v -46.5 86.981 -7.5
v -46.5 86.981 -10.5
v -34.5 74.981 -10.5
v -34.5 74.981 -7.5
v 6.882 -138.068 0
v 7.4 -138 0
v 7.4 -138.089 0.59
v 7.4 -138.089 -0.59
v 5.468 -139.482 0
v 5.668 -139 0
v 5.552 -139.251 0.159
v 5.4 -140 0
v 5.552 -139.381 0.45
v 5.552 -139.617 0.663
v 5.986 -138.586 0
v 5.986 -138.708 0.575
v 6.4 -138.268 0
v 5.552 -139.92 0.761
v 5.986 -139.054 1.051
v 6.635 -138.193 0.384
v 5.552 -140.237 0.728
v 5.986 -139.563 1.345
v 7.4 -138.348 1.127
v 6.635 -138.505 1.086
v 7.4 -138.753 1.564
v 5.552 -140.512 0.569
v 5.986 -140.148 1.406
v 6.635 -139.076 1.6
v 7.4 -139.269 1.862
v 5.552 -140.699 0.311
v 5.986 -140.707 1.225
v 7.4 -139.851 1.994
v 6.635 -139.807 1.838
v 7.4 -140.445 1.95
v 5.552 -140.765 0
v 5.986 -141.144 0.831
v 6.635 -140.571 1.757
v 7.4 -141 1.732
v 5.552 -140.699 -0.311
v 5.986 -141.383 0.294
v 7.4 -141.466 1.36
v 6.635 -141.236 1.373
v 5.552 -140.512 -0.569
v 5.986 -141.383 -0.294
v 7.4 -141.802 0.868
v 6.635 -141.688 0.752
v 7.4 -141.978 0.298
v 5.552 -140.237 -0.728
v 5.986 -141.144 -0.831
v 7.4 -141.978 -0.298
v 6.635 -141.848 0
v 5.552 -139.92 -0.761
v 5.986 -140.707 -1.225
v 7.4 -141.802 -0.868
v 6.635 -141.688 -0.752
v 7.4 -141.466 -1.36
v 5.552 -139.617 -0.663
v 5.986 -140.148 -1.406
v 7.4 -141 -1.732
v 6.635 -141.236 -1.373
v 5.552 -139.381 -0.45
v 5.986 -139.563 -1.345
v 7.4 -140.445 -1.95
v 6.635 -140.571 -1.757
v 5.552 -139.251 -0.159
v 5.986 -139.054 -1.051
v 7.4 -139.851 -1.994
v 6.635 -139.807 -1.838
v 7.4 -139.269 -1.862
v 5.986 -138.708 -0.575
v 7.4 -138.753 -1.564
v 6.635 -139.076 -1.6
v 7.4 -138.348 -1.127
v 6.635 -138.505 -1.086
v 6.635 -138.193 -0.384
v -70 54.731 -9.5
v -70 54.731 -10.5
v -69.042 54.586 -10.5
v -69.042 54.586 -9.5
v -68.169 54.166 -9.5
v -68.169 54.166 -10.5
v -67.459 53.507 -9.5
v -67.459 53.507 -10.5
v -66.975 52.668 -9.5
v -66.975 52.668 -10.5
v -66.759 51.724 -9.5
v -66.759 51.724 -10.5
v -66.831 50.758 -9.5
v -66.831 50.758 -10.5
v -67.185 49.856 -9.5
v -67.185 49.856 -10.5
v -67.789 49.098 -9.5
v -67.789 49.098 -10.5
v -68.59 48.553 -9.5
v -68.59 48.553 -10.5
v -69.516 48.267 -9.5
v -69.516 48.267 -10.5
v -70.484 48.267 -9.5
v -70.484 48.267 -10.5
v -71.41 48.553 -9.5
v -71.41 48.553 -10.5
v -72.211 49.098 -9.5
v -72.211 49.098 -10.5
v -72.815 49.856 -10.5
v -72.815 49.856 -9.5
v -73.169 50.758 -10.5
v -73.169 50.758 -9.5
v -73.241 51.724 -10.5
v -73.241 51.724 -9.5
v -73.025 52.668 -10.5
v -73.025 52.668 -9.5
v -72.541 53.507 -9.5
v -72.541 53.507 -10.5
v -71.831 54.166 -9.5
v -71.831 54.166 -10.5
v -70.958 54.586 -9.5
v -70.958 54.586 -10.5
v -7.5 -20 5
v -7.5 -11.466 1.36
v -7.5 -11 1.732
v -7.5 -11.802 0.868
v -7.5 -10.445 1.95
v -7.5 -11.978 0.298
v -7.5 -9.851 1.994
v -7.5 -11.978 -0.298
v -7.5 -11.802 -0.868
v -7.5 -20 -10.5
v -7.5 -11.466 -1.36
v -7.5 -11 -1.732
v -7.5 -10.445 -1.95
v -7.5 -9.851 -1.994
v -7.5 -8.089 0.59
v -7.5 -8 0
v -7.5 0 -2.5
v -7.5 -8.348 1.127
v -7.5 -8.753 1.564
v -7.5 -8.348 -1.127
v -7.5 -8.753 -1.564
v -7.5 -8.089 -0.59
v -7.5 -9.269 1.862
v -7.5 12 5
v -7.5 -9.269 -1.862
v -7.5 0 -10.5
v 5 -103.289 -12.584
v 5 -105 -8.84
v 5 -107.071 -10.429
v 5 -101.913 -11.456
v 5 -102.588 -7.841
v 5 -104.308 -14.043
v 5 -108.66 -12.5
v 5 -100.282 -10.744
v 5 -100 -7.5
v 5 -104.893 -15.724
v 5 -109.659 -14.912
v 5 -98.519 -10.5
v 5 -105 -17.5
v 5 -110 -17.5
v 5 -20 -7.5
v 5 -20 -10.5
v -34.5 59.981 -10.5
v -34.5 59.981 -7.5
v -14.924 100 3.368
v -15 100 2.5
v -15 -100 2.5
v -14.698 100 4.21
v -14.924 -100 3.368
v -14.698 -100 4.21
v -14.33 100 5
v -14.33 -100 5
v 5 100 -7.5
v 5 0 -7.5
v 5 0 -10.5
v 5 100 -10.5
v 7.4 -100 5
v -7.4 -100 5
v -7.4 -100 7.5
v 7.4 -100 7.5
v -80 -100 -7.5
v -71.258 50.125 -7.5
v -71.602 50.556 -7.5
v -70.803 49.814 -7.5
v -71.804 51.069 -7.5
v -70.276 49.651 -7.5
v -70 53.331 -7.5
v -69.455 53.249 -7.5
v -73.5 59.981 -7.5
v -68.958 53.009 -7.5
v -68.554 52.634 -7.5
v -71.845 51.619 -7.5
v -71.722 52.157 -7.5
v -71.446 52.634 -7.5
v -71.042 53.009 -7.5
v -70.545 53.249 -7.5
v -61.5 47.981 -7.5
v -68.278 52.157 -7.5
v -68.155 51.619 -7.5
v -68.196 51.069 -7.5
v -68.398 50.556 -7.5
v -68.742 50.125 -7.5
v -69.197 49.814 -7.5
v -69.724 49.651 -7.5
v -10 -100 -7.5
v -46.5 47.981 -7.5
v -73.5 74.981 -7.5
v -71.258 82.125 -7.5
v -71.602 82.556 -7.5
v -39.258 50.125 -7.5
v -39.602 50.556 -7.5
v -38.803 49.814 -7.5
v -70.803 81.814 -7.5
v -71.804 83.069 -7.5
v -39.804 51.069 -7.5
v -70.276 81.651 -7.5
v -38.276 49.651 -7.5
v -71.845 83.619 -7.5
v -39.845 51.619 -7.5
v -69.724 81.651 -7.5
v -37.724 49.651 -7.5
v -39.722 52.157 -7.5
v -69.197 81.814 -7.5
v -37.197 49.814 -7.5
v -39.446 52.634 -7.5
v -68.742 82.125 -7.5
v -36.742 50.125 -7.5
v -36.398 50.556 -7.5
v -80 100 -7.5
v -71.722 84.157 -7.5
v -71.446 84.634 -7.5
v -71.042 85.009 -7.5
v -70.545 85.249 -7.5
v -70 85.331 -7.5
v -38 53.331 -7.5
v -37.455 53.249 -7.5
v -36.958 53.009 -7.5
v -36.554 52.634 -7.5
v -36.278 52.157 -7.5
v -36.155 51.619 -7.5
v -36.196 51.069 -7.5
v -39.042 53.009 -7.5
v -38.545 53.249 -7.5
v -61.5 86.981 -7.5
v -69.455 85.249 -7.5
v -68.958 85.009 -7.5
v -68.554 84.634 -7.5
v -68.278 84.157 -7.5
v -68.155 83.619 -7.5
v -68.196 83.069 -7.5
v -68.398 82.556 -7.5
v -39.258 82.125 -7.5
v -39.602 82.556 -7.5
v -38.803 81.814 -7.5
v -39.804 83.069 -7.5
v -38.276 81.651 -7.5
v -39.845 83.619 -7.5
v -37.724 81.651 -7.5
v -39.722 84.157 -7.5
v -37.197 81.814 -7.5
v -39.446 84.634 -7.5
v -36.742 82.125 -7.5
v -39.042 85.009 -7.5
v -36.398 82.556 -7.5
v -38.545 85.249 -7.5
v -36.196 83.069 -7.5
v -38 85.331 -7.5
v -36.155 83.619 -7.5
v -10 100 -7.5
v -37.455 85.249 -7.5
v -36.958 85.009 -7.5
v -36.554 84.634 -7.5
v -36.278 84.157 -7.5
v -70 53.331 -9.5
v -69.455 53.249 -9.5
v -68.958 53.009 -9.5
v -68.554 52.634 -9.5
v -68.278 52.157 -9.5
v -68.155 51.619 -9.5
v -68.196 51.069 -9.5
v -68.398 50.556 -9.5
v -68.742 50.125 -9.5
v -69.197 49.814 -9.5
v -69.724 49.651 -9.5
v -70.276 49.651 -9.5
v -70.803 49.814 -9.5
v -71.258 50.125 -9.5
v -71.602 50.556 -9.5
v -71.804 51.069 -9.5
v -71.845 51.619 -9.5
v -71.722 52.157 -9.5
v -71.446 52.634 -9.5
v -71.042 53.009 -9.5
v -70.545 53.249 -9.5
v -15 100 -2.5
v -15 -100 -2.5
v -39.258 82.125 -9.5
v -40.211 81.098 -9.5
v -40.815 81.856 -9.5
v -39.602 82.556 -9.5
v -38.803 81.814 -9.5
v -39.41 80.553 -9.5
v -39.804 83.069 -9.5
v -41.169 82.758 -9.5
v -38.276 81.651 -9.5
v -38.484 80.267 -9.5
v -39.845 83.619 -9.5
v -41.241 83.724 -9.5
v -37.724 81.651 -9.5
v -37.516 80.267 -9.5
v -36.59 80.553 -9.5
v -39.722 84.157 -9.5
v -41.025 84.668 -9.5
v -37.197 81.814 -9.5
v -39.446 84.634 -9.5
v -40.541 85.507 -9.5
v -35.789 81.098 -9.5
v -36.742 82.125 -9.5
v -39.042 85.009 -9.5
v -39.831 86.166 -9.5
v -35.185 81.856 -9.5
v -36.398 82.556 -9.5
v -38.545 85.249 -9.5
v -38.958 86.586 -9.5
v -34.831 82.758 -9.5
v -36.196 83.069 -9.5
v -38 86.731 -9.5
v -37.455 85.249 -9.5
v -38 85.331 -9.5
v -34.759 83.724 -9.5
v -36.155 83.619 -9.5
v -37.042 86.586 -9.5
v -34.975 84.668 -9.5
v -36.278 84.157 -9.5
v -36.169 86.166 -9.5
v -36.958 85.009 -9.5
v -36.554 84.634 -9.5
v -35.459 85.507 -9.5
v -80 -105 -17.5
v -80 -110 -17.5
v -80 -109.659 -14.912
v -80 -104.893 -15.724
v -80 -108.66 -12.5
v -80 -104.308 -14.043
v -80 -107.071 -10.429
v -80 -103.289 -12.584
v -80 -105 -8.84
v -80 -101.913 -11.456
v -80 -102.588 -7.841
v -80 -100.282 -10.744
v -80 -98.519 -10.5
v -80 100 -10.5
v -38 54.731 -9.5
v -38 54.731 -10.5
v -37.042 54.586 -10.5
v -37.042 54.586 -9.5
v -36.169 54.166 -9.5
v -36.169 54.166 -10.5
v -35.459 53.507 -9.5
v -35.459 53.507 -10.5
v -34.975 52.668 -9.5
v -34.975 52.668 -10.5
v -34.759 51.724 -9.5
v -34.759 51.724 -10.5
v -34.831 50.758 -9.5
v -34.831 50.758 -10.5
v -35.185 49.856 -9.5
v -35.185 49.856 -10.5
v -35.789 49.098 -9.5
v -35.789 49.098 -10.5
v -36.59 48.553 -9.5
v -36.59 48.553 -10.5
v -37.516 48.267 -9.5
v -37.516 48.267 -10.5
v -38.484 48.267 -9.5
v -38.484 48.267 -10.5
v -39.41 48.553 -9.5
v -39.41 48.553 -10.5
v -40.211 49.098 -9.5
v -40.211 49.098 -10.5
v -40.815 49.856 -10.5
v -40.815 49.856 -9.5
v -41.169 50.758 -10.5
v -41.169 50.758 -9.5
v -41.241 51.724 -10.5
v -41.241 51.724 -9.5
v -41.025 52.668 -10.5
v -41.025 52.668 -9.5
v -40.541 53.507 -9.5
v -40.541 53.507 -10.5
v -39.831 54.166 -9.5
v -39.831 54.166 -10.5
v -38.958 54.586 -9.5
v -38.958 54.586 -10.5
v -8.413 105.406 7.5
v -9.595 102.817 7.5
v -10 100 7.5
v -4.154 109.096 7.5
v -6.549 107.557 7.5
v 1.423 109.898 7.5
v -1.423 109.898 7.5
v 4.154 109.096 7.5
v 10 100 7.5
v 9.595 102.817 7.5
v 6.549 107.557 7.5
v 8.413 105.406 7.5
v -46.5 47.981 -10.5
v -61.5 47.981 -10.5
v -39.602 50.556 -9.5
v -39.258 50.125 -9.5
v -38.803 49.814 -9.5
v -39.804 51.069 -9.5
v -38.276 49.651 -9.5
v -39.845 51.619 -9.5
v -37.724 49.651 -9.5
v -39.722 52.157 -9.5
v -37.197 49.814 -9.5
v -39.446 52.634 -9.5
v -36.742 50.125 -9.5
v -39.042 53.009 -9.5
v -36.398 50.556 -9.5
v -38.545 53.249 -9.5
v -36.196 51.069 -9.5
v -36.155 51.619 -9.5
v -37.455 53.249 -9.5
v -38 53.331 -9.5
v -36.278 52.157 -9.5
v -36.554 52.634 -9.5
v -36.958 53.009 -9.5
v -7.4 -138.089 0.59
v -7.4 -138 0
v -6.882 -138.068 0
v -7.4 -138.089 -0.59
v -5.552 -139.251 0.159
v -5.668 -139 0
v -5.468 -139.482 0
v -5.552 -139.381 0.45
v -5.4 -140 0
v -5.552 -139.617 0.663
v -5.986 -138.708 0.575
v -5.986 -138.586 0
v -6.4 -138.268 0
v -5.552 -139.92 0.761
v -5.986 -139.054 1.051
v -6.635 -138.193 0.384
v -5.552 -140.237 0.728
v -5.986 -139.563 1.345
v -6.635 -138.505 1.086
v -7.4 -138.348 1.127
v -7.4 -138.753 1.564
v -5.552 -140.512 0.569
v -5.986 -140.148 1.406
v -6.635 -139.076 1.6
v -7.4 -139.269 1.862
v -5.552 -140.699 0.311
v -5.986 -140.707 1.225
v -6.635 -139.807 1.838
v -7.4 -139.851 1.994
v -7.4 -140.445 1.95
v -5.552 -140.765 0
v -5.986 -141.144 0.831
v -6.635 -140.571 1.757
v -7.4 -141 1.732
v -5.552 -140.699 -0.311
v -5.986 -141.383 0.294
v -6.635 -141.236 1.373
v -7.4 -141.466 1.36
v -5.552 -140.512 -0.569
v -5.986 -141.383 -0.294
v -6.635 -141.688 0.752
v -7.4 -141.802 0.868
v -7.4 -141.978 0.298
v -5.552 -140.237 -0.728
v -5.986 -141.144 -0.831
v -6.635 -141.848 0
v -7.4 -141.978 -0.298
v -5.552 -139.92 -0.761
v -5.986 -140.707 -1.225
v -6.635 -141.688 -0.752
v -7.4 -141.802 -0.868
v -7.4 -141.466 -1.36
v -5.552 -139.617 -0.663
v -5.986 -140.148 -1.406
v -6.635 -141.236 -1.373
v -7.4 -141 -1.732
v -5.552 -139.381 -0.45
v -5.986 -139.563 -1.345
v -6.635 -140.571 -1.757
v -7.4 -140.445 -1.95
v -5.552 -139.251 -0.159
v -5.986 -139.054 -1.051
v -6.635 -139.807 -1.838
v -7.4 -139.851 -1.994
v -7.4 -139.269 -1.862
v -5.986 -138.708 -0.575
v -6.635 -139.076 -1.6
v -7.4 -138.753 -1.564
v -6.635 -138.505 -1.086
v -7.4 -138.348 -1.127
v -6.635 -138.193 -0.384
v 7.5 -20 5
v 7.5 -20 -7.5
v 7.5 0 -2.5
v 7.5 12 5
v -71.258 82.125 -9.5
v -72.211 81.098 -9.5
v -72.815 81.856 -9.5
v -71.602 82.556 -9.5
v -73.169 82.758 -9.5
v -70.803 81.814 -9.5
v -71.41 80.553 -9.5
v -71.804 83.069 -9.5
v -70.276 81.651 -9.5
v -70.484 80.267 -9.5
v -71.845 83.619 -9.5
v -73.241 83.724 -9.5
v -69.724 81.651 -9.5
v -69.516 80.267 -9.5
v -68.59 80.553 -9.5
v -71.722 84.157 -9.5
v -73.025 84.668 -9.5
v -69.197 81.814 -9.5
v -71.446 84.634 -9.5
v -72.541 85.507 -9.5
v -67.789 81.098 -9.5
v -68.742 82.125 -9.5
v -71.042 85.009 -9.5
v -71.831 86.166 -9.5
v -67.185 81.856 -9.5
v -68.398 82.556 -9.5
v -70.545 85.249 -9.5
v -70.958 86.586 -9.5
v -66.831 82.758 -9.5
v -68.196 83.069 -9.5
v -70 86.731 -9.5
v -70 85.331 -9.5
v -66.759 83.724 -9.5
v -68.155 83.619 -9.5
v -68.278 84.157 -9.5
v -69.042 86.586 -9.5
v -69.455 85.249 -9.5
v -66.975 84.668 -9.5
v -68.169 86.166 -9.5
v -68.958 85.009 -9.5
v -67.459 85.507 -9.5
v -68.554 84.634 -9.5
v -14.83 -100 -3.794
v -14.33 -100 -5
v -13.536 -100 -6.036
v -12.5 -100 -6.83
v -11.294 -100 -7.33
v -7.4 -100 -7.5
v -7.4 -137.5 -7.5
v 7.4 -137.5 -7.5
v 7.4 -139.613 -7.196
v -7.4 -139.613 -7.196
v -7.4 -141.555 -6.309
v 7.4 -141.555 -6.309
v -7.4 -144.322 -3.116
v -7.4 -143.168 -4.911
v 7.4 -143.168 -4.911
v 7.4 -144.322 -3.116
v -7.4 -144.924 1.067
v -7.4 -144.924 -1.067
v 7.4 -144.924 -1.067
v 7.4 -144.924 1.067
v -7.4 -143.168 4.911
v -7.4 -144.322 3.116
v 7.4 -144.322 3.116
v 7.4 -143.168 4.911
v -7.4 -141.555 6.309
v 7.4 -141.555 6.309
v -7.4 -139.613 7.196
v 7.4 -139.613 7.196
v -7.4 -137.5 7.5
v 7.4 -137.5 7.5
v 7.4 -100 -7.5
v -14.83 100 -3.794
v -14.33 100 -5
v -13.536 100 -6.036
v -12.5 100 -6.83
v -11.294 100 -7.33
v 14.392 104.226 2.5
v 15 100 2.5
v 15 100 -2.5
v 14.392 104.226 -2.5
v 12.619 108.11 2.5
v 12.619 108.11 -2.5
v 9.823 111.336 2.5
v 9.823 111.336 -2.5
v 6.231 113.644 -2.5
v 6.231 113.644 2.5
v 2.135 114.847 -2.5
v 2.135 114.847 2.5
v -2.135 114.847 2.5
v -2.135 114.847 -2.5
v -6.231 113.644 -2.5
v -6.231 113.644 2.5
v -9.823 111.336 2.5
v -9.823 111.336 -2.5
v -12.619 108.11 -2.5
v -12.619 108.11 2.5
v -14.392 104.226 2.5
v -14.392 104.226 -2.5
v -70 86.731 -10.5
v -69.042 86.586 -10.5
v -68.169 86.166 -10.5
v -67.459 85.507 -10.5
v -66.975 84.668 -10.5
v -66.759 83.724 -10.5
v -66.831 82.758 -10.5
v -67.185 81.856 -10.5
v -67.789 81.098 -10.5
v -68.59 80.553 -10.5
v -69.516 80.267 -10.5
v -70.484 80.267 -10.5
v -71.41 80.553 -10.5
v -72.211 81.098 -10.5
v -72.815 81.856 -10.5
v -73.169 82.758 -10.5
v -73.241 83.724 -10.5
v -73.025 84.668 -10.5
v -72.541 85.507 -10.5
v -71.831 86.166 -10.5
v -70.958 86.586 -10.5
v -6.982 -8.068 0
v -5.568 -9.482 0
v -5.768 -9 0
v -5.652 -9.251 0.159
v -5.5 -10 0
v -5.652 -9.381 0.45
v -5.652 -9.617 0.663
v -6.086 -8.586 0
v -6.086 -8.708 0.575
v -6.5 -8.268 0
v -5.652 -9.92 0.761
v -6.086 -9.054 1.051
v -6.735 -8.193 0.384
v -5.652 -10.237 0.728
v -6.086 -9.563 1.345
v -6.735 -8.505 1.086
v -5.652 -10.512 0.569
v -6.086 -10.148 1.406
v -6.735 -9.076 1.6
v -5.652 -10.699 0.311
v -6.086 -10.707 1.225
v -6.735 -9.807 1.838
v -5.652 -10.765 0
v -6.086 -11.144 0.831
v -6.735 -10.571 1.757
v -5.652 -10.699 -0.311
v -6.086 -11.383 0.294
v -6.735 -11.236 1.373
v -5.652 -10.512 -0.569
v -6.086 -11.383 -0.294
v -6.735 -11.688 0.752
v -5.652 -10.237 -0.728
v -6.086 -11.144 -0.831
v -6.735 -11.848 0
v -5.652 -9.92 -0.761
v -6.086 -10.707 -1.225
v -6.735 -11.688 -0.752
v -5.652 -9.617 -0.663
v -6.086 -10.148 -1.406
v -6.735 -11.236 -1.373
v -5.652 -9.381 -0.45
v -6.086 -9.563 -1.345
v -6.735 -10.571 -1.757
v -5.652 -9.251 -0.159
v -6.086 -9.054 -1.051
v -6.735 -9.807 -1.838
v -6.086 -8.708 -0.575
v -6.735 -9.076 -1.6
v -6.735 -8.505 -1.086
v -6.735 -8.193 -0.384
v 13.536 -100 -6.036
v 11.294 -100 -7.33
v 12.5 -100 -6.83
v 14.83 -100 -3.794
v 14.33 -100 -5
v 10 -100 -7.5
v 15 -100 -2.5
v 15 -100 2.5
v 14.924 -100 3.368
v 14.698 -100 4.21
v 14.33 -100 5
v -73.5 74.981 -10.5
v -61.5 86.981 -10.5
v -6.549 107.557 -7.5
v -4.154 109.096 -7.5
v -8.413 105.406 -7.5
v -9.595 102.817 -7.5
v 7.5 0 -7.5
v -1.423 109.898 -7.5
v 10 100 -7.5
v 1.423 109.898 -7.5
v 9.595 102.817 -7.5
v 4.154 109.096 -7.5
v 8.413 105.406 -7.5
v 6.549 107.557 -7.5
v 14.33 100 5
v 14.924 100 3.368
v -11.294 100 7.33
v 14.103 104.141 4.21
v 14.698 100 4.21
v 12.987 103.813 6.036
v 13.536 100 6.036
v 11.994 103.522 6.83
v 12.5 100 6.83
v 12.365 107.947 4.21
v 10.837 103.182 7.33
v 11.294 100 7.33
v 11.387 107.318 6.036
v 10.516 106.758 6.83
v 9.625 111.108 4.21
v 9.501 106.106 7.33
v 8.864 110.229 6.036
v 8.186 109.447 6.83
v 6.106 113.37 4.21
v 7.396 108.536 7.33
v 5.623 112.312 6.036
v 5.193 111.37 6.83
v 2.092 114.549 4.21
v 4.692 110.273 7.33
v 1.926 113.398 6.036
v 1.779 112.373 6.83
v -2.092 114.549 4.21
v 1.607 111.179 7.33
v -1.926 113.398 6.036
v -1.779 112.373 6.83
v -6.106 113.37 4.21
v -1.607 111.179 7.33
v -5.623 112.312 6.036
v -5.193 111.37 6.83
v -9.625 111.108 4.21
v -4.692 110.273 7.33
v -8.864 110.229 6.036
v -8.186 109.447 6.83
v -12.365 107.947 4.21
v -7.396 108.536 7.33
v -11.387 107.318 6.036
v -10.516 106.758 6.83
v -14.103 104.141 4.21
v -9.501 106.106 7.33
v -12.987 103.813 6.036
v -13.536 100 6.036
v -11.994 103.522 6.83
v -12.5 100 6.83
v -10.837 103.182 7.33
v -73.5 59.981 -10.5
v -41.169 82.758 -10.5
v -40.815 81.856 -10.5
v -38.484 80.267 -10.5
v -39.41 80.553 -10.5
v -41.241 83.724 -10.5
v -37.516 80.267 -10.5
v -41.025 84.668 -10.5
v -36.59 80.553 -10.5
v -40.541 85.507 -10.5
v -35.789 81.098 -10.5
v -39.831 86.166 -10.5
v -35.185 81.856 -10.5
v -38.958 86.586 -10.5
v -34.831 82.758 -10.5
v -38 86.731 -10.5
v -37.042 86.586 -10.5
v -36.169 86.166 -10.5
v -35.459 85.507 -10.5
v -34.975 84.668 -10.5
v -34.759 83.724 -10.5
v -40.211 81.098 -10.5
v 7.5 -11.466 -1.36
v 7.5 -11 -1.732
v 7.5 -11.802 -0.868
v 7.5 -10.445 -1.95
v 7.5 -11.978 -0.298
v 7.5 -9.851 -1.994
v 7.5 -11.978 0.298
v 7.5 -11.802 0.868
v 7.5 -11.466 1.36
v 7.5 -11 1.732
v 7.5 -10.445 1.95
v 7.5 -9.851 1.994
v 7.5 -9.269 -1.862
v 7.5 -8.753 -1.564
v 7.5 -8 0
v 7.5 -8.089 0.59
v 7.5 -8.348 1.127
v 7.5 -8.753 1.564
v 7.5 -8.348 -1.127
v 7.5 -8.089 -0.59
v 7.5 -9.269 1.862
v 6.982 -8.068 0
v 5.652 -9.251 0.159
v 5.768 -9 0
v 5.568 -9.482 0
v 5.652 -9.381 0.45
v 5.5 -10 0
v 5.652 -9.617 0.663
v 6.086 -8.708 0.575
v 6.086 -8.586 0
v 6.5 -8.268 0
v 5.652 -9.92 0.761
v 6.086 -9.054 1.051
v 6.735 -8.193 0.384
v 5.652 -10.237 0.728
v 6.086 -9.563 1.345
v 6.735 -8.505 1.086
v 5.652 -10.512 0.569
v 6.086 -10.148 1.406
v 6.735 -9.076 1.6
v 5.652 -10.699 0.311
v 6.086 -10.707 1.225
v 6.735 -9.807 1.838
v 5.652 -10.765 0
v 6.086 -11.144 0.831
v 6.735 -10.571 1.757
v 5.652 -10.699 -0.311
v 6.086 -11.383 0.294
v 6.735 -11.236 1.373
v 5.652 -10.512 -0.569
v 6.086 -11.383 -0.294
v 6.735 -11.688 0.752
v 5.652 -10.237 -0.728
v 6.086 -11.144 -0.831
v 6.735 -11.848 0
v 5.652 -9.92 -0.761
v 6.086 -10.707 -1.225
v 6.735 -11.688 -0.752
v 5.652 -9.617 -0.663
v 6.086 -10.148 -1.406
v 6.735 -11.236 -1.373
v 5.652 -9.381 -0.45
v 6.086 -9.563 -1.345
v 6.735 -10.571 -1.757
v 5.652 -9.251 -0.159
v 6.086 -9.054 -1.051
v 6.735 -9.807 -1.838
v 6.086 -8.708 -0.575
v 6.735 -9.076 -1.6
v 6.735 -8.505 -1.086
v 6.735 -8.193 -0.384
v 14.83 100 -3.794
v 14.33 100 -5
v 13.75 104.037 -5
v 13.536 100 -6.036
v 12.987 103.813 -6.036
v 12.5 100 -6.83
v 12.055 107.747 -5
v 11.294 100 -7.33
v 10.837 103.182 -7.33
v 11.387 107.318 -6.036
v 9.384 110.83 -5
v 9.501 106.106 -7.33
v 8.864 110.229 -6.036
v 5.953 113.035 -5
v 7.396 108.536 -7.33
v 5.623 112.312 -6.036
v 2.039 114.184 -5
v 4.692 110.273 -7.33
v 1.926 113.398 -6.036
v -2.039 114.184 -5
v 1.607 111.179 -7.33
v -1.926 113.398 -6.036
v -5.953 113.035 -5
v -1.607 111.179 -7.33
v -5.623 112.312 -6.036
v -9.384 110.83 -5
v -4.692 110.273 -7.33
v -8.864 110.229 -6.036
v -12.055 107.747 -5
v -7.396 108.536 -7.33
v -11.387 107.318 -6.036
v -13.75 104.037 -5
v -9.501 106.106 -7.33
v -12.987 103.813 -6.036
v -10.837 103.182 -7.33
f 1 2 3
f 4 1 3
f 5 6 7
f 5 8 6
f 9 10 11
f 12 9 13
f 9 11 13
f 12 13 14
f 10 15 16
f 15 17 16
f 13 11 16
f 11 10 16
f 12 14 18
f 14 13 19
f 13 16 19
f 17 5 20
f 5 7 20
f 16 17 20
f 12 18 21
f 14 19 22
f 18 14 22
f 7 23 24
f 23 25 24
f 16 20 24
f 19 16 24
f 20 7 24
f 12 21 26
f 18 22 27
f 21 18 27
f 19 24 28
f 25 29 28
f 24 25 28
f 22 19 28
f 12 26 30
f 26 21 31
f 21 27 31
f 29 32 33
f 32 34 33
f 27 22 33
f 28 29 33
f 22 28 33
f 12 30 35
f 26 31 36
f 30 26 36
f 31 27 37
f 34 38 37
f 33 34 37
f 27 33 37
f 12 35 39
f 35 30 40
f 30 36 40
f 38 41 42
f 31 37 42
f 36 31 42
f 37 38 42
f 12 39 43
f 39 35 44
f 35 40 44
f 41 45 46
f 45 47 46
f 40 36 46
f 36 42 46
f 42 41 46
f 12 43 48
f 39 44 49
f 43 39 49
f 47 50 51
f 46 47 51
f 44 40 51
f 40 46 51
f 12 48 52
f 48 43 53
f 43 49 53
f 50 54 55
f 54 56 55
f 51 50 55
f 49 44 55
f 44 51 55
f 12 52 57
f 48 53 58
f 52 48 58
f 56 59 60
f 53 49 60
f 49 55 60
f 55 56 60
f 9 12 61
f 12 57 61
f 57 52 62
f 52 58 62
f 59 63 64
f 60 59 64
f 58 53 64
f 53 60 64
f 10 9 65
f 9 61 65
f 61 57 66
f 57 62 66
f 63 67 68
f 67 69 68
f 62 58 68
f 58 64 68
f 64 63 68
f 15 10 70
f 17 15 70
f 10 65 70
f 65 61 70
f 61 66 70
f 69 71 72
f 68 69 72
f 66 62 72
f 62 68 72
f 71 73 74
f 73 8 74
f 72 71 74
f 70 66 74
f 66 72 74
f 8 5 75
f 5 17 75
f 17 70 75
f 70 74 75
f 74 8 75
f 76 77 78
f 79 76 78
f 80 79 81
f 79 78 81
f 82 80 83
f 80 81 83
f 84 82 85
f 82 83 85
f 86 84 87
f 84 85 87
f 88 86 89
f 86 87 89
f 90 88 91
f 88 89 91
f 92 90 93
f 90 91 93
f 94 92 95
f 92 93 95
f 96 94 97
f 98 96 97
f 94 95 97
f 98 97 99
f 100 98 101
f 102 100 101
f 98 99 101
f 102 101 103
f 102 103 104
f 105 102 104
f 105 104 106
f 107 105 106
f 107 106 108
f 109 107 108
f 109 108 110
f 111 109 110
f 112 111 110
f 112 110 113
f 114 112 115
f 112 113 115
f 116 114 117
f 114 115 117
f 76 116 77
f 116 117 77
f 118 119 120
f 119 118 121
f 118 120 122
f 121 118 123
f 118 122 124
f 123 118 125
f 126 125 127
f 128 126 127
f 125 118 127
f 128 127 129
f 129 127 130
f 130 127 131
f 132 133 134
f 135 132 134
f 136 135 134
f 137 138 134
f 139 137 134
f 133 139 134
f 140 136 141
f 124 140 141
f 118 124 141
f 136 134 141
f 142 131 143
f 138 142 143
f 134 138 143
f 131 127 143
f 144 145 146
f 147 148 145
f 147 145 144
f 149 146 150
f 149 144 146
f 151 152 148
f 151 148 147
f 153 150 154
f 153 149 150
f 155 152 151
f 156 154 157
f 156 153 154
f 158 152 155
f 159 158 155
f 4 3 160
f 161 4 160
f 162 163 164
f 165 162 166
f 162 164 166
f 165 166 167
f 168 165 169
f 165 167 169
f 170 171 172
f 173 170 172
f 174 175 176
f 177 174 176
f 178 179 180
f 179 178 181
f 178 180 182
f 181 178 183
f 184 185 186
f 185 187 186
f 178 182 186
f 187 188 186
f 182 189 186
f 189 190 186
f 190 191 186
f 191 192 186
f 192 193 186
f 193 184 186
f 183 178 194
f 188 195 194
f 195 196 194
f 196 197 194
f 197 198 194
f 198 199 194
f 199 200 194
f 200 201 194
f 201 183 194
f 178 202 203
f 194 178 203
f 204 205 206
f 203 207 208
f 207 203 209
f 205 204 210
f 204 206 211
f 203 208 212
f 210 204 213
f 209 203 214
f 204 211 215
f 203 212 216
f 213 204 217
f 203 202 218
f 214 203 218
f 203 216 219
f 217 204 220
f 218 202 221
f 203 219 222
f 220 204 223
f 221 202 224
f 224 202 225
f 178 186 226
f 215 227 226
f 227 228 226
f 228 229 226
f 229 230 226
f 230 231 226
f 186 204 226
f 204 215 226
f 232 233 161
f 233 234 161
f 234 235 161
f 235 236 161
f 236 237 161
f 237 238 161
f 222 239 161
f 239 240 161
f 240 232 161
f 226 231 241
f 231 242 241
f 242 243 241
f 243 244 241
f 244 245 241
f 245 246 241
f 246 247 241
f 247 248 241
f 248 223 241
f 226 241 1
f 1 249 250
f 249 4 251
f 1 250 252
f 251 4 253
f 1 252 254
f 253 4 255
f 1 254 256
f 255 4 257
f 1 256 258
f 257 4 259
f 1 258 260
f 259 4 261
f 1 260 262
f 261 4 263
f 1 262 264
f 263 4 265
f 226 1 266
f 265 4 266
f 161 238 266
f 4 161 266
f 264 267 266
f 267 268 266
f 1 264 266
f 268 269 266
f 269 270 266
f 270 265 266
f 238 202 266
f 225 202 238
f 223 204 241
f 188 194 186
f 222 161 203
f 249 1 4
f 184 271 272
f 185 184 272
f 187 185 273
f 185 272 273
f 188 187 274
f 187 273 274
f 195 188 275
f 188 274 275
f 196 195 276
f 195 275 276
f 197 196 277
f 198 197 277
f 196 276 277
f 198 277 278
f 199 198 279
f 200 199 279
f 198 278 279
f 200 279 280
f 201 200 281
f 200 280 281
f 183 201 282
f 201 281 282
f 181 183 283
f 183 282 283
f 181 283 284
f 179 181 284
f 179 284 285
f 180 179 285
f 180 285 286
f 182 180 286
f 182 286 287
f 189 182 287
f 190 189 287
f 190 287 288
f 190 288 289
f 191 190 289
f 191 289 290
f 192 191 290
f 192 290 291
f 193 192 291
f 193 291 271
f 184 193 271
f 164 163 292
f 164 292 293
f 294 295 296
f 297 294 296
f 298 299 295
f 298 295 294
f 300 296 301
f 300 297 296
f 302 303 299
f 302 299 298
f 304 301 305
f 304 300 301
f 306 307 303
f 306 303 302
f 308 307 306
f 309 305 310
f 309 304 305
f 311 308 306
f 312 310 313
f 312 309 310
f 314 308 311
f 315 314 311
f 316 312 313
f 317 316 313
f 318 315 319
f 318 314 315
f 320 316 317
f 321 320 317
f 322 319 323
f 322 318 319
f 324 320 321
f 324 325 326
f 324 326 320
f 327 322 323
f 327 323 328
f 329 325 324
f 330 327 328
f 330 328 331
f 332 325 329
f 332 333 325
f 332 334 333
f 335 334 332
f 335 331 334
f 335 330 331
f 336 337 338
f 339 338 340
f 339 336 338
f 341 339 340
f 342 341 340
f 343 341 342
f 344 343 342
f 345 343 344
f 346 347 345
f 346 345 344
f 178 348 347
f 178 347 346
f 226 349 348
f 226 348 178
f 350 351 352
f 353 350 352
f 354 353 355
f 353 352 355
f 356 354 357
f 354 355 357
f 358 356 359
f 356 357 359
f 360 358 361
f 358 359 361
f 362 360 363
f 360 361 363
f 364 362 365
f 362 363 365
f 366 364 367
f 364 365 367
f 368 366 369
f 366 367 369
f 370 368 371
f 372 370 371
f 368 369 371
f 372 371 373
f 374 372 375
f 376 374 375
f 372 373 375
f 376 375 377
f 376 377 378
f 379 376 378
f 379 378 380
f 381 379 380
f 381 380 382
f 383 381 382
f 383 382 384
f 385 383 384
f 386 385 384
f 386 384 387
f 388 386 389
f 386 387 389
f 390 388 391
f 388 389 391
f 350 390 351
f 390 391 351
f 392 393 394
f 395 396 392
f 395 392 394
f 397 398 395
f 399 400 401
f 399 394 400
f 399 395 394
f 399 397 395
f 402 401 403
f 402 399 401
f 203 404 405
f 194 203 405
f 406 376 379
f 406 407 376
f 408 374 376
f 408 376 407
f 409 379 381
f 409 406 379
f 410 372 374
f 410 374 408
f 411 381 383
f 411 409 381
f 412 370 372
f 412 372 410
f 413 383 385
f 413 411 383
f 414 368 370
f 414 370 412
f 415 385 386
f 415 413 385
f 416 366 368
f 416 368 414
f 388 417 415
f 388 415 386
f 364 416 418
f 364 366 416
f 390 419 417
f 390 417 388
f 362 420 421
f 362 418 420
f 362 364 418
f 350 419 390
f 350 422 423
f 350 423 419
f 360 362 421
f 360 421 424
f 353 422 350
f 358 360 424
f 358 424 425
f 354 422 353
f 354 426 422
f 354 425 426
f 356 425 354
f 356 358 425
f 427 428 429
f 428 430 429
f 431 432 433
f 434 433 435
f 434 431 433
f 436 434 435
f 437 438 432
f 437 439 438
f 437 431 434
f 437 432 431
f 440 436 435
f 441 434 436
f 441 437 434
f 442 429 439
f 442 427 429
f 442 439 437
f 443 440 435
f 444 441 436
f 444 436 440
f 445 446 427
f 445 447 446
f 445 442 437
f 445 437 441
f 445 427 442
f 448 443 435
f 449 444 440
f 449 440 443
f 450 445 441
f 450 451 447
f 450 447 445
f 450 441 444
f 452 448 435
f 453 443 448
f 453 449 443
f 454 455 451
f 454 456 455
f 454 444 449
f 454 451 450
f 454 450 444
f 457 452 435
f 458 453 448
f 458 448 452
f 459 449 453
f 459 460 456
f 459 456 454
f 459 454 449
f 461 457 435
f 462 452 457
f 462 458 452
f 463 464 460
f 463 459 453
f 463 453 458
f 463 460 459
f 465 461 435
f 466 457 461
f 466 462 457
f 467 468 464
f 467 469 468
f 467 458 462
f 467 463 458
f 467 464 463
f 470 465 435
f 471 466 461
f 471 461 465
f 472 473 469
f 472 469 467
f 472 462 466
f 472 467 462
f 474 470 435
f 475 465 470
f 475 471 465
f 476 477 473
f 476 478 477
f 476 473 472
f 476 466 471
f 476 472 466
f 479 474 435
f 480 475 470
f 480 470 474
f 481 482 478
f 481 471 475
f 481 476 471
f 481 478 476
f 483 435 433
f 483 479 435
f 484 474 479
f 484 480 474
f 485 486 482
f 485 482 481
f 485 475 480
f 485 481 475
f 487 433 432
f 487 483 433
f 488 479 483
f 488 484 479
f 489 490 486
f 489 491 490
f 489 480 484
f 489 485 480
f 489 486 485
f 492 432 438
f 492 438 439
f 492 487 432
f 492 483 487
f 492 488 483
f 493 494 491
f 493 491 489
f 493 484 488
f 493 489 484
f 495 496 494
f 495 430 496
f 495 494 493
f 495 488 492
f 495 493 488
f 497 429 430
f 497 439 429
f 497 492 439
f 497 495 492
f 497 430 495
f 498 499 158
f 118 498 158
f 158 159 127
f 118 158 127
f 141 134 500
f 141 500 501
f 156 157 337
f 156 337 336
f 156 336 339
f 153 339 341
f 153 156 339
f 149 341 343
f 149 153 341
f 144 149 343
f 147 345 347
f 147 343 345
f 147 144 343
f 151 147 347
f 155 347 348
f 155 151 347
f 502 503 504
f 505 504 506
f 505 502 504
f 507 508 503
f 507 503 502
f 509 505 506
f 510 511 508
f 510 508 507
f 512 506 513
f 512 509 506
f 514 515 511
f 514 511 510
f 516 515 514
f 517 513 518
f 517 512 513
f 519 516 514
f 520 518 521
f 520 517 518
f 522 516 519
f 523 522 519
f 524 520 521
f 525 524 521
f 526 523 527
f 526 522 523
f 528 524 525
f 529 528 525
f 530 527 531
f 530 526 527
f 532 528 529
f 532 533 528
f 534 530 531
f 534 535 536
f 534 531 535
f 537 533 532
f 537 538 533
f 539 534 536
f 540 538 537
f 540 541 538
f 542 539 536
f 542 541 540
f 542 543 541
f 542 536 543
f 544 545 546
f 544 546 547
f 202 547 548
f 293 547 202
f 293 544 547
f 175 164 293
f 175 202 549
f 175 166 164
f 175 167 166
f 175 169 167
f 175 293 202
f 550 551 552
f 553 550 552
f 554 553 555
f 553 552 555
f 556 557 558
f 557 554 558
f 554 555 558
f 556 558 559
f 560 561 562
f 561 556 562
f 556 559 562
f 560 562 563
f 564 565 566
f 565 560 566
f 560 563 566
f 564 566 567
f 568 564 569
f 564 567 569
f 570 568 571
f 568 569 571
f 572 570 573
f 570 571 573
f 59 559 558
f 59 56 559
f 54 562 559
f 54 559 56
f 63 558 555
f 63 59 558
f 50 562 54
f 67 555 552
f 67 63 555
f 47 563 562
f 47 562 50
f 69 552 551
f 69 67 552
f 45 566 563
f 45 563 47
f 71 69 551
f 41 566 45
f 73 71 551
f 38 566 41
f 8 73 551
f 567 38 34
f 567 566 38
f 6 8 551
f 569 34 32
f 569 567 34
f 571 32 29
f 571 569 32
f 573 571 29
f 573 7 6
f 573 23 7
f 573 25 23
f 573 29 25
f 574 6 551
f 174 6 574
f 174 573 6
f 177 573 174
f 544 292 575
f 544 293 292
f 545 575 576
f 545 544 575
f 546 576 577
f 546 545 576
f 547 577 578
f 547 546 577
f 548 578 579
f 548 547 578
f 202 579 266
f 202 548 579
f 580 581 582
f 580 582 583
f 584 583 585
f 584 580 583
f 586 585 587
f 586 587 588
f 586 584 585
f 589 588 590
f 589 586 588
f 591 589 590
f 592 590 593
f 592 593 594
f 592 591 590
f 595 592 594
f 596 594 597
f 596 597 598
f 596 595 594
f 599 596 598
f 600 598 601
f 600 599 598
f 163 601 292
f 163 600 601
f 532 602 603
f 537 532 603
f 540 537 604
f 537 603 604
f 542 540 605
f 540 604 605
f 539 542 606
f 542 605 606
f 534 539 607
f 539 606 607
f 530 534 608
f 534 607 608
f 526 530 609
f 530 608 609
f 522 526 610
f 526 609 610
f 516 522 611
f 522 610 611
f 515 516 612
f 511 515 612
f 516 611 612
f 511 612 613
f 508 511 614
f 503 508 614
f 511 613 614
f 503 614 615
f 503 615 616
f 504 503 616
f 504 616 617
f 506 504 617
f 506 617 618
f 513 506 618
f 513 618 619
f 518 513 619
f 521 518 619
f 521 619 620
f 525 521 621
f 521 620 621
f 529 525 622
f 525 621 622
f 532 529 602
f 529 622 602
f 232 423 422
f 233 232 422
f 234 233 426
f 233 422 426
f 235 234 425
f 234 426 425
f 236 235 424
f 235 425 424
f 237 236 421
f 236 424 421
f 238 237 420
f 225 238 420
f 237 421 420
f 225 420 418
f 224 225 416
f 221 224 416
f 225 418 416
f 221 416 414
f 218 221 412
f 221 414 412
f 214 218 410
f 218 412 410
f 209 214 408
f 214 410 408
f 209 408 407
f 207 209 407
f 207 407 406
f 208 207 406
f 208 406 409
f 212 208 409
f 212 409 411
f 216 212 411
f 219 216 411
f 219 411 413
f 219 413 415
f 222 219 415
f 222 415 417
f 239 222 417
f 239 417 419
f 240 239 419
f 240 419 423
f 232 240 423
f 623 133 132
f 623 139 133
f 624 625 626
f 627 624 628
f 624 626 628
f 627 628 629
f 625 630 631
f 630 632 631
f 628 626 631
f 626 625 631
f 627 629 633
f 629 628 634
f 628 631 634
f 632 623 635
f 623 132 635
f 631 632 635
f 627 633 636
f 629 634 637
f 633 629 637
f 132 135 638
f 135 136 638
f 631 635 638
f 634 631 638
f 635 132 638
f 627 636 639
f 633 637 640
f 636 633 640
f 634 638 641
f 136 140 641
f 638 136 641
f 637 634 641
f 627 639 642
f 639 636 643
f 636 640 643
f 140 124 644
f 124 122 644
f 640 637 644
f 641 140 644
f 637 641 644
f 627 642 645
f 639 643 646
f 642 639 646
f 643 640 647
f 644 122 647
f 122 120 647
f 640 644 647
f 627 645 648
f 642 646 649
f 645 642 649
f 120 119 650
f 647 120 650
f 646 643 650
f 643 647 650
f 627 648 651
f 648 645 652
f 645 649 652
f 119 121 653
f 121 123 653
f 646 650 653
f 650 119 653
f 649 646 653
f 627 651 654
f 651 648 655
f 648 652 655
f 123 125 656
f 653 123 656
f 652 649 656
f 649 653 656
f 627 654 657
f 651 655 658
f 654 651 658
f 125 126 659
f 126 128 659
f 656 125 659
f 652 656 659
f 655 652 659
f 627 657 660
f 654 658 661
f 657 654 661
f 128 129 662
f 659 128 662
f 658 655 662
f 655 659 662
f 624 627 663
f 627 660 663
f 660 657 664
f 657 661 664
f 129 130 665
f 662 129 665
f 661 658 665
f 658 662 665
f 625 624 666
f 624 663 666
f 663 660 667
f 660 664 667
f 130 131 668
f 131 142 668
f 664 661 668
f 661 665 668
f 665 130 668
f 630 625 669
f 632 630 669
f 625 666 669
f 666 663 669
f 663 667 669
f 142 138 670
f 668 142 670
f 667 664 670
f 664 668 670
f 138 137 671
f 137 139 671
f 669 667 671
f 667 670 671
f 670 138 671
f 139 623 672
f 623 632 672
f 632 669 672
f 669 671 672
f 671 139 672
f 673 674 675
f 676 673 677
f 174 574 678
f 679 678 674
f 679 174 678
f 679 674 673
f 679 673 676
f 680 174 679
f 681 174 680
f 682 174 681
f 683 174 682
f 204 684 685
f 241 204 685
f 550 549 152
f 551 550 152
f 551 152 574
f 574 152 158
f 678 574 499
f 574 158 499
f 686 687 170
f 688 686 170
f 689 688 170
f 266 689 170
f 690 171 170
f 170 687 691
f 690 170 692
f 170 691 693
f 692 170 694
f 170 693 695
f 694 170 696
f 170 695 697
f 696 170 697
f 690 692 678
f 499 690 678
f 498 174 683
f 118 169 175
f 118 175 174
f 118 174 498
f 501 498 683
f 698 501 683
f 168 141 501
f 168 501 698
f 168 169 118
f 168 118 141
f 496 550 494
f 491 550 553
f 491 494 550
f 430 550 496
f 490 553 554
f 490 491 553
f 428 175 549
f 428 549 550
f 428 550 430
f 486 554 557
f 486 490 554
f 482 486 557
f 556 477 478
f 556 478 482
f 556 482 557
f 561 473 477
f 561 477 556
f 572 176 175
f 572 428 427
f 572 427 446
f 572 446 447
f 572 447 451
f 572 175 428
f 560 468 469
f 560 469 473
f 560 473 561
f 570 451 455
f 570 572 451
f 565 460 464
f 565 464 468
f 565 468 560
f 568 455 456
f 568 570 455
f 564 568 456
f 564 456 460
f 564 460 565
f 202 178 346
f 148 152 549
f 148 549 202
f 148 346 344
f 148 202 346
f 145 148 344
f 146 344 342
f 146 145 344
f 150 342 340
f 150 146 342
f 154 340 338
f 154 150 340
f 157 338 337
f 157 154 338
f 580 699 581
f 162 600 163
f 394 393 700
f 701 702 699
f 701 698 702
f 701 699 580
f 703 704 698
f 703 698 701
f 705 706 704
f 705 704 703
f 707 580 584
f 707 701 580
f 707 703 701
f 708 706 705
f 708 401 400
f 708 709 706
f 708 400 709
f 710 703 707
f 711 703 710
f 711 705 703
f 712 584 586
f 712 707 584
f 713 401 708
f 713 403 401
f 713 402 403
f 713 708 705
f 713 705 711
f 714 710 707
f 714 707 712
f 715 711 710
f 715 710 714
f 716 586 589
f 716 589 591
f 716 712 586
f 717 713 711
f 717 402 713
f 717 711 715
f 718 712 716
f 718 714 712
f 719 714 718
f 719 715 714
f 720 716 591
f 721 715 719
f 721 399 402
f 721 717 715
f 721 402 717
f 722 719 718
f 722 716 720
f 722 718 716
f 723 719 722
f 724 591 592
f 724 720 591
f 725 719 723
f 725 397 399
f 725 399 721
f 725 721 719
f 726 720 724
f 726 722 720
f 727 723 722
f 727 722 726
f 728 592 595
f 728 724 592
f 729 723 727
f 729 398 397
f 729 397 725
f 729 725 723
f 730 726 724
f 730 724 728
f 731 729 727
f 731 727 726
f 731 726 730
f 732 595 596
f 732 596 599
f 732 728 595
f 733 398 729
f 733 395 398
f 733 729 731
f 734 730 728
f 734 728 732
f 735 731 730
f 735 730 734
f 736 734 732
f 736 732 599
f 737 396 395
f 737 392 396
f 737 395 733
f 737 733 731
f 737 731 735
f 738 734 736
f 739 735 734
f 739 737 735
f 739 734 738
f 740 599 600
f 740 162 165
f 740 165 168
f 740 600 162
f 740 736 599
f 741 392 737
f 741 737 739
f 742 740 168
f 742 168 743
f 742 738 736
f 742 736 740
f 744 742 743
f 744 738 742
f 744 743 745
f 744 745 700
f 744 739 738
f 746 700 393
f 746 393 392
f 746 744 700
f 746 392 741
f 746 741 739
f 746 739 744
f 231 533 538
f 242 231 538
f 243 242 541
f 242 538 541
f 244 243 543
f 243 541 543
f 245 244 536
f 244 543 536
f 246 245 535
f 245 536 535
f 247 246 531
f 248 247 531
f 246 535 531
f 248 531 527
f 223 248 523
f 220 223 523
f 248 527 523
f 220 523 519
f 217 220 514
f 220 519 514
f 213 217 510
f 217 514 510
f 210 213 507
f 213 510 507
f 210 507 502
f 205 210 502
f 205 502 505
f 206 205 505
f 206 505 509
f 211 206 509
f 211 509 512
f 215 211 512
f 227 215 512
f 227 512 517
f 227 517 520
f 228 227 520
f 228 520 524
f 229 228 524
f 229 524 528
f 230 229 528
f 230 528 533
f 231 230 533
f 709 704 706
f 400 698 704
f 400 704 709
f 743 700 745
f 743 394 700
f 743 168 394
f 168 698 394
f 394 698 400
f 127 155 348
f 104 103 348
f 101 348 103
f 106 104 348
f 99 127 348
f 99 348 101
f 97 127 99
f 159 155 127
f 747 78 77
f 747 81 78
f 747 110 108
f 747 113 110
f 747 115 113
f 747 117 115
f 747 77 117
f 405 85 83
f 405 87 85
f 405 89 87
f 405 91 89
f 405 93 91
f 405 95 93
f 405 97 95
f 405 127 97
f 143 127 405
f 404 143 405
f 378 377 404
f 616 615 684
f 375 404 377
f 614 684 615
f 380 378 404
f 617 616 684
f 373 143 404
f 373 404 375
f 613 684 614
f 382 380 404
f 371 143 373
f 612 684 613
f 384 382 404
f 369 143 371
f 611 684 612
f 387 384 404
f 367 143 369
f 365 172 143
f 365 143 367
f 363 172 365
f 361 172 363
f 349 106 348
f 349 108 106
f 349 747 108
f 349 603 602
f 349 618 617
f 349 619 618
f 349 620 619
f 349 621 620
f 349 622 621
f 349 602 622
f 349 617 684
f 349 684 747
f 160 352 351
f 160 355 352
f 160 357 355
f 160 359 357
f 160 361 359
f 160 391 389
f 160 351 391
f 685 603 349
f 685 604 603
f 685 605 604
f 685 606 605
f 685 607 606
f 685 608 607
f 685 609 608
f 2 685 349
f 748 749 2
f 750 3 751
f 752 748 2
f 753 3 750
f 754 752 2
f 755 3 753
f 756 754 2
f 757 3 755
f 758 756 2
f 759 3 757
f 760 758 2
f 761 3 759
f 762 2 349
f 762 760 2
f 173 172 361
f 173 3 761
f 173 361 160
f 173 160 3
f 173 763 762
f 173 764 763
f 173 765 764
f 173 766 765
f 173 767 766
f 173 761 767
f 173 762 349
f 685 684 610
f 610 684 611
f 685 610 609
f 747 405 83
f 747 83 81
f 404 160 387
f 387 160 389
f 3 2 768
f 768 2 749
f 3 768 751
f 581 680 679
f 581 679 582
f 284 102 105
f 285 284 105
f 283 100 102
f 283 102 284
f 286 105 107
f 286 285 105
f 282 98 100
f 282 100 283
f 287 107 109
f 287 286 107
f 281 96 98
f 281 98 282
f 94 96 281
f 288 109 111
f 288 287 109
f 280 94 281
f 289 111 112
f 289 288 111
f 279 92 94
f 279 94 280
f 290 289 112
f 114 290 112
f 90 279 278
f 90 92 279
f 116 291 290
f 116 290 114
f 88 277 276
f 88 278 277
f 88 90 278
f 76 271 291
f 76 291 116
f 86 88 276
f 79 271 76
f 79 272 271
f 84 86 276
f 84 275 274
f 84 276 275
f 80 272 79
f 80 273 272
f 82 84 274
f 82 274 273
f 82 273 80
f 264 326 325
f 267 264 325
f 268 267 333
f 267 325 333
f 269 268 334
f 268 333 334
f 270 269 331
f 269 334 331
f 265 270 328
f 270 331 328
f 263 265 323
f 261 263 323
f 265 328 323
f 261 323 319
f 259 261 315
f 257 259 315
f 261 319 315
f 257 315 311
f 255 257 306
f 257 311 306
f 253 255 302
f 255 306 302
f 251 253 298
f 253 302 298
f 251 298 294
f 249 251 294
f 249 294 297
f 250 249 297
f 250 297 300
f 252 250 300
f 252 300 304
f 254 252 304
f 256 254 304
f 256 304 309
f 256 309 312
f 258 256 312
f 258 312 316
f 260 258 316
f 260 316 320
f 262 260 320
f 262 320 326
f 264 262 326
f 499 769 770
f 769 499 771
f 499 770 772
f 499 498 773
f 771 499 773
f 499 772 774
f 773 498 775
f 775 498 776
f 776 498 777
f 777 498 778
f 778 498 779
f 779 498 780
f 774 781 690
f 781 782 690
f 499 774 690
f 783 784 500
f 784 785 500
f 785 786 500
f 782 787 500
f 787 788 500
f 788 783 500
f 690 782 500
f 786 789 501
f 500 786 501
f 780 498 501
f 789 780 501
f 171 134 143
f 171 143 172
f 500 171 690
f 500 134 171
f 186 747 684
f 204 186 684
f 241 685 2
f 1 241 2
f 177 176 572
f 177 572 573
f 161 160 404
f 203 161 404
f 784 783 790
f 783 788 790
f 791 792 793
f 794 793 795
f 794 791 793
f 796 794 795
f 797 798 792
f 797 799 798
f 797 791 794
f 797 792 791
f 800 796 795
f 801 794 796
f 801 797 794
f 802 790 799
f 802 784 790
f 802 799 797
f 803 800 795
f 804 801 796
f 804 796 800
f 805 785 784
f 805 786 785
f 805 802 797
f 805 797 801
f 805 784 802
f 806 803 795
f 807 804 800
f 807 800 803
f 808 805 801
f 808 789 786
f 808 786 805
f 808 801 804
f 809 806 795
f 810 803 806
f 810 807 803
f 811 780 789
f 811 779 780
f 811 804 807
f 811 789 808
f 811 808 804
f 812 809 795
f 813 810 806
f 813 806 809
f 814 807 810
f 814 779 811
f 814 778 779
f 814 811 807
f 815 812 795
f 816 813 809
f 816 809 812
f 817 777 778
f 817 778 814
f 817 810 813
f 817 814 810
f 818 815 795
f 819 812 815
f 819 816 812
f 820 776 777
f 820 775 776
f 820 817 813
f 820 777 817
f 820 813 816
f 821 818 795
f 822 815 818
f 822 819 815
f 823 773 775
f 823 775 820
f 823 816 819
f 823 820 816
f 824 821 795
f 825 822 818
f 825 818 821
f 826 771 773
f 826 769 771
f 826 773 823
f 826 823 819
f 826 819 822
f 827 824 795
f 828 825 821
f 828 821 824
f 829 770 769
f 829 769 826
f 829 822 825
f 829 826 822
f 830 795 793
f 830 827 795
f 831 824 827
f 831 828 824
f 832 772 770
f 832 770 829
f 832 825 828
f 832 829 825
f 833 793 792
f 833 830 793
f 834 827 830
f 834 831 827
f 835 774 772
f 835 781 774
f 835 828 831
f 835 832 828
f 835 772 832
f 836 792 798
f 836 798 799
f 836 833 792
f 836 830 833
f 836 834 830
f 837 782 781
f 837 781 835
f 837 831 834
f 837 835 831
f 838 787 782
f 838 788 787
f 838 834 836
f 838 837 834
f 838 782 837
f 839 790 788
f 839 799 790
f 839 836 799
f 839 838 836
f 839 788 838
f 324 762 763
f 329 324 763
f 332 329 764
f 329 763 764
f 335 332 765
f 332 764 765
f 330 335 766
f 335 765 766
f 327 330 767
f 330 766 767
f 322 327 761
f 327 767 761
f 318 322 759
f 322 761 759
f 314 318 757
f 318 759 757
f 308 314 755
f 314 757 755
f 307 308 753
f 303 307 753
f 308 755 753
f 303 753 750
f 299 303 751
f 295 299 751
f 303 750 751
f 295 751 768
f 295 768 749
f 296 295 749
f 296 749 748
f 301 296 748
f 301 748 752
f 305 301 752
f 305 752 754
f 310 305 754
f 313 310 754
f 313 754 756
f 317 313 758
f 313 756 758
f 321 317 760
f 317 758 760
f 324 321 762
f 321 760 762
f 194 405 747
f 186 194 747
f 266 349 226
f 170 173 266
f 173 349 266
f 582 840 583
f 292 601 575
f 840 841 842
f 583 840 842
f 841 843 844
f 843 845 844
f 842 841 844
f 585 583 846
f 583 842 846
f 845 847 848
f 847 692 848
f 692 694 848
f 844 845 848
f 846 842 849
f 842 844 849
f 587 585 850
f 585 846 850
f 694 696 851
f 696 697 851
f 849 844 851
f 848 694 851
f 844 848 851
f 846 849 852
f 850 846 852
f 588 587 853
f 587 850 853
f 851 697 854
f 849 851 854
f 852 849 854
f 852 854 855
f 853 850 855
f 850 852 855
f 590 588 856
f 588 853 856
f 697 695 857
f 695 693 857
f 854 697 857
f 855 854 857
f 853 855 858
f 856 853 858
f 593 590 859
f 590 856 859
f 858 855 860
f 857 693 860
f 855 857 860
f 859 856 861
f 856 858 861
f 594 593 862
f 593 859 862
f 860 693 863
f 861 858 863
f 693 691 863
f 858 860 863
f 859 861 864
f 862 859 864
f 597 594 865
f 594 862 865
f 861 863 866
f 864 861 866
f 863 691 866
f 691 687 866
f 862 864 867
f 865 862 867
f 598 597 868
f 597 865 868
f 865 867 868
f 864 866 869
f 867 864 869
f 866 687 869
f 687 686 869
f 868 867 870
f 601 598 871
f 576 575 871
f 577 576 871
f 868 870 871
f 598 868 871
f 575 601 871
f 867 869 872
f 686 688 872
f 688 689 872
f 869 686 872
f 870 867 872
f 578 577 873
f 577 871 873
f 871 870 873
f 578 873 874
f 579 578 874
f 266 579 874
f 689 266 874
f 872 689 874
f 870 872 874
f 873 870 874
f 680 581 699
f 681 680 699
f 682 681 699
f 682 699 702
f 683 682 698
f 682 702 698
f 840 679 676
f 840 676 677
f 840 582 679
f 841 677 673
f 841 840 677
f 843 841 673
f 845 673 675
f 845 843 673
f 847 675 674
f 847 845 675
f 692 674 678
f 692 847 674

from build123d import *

# Parameters (mm, degrees)
BOSS_EXTRUDE1_DEPTH = 7.5
FILLET1_R           = 5
SKETCH2_W           = 15
SKETCH2_H           = 20
CUT_EXTRUDE1_DEPTH  = 152.492574075
FILLET6_R           = 5
CUT_EXTRUDE2_DEPTH  = 152.848641746
BOSS_EXTRUDE2_DEPTH = 80
BOSS_EXTRUDE3_START = 5
BOSS_EXTRUDE3_DEPTH = 5
SKETCH12_W          = 12.5
SKETCH12_H          = 20
CUT_EXTRUDE3_DEPTH  = 3
SKETCH13_W          = 2.5
SKETCH13_H          = 200
CUT_EXTRUDE4_DEPTH  = 160.863222787
SKETCH14_R          = 1.85
CUT_EXTRUDE5_DEPTH  = 10
SKETCH15_R          = 3.25
CUT_EXTRUDE6_DEPTH  = 1
CUT_EXTRUDE7_DEPTH  = 7.5


with BuildPart() as part:
    # Sketch1 → Boss-Extrude1 (new, symmetric)
    with BuildSketch(Plane.XY):
        with BuildLine():
            Line((-15, 100), (-15, -100))
            Line((-15, -100), (-7.4, -100))
            Line((-7.4, -100), (-7.4, -150))
            Line((-7.4, -150), (7.4, -150))
            Line((7.4, -150), (7.4, -100))
            Line((7.4, -100), (15, -100))
            Line((15, -100), (15, 100))
            ThreePointArc((15, 100), (0, 115), (-15, 100))
        make_face()
    extrude(amount=BOSS_EXTRUDE1_DEPTH, both=True)

    # Fillet1
    fillet1_edges = [part.edges().sort_by_distance(p)[0] for p in [
        (-15, 0, -7.5),
        (0, 115, -7.5),
        (15, 0, 7.5),
        (0, 115, 7.5),
        (15, 0, -7.5),
        (-15, 0, 7.5),
    ]]
    fillet(fillet1_edges, radius=FILLET1_R)

    # Sketch2 → Cut-Extrude1 (cut, through all)
    with BuildSketch(Plane.XY.offset(7.5)):
        with Locations((0, -10)):
            Rectangle(SKETCH2_W, SKETCH2_H)
    extrude(amount=-CUT_EXTRUDE1_DEPTH, mode=Mode.SUBTRACT)

    # Sketch5 → Cut-Revolve1 (revolve, cut)
    with BuildSketch(Plane.XY):
        with BuildLine():
            Line((-7.4, -140), (-5.4, -140))
            ThreePointArc((-5.4, -140), (-5.985786438, -138.585786438), (-7.4, -138))
            Line((-7.4, -138), (-7.4, -140))
        make_face()
        with BuildLine():
            Line((7.4, -140), (5.4, -140))
            ThreePointArc((5.4, -140), (5.985786438, -138.585786438), (7.4, -138))
            Line((7.4, -138), (7.4, -140))
        make_face()
    revolve(axis=Axis((-35.580304025, -140, 0), (1, 0, 0)), mode=Mode.SUBTRACT)

    # Fillet6
    fillet6_edges = [part.edges().sort_by_distance(p)[0] for p in [
        (7.4, -150, 0),
        (-7.4, -150, 0),
    ]]
    fillet(fillet6_edges, radius=FILLET6_R)

    # Sketch7 → Cut-Extrude2 (cut, through all)
    with BuildSketch(Plane(origin=(7.4, 0, 0), x_dir=(0, 0, -1), z_dir=(1, 0, 0))):
        with BuildLine():
            Line((-7.5, -137.5), (-7.5, -150))
            Line((-7.5, -150), (7.5, -150))
            Line((7.5, -150), (7.5, -137.5))
            ThreePointArc((7.5, -137.5), (0, -145), (-7.5, -137.5))
        make_face()
    extrude(amount=-CUT_EXTRUDE2_DEPTH, mode=Mode.SUBTRACT)

    # Sketch9 → Revolve2 (revolve)
    with BuildSketch(Plane.XY):
        with BuildLine():
            Line((-7.5, -10), (-5.5, -10))
            ThreePointArc((-5.5, -10), (-6.085786438, -8.585786438), (-7.5, -8))
            Line((-7.5, -8), (-7.5, -10))
        make_face()
        with BuildLine():
            Line((7.5, -10), (5.5, -10))
            ThreePointArc((5.5, -10), (6.085786438, -8.585786438), (7.5, -8))
            Line((7.5, -8), (7.5, -10))
        make_face()
    revolve(axis=Axis((-32.251262552, -10, 0), (1, 0, 0)))

    # Sketch10 → Boss-Extrude2 (add)
    with BuildSketch(Plane(origin=(0, 0, 0), x_dir=(0, 0, -1), z_dir=(1, 0, 0))):
        with BuildLine():
            Line((7.5, -100), (7.5, 100))
            Line((7.5, 100), (10.5, 100))
            Line((10.5, 100), (10.5, -98.519259302))
            ThreePointArc((10.5, -98.519259302), (12.584119567, -103.288955309), (17.5, -105))
            Line((17.5, -105), (17.5, -110))
            ThreePointArc((17.5, -110), (10.428932188, -107.071067812), (7.5, -100))
        make_face()
    extrude(amount=-BOSS_EXTRUDE2_DEPTH)

    # Sketch11 → Boss-Extrude3 (add)
    with BuildSketch(Plane(origin=(0, 0, 0), x_dir=(0, 0, -1), z_dir=(1, 0, 0)).offset(BOSS_EXTRUDE3_START)):
        with BuildLine():
            Line((17.5, -110), (17.5, -105))
            ThreePointArc((17.5, -105), (12.584119567, -103.288955309), (10.5, -98.519259302))
            Line((10.5, -98.519259302), (10.5, 100))
            Line((10.5, 100), (7.5, 100))
            Line((7.5, 100), (7.5, -100))
            ThreePointArc((7.5, -100), (10.428932188, -107.071067812), (17.5, -110))
        make_face()
    extrude(amount=-BOSS_EXTRUDE3_DEPTH)

    # Sketch12 → Cut-Extrude3 (cut)
    with BuildSketch(Plane(origin=(0, 0, -10.5), x_dir=(-1, 0, 0), z_dir=(0, 0, -1))):
        with Locations((1.25, -10)):
            Rectangle(SKETCH12_W, SKETCH12_H)
    extrude(amount=-CUT_EXTRUDE3_DEPTH, mode=Mode.SUBTRACT)

    # Sketch13 → Cut-Extrude4 (cut, through all)
    with BuildSketch(Plane.ZY.offset(15)):
        with Locations((6.25, 0)):
            Rectangle(SKETCH13_W, SKETCH13_H)
    extrude(amount=-CUT_EXTRUDE4_DEPTH, mode=Mode.SUBTRACT)

    # Sketch14 → Cut-Extrude5 (cut)
    with BuildSketch(Plane(origin=(0, 0, -10.5), x_dir=(-1, 0, 0), z_dir=(0, 0, -1))):
        with Locations(Location((70, 51.480740698, 0), (0, 0, 90))):
            Circle(SKETCH14_R)
        with Locations(Location((70, 83.480740698, 0), (0, 0, 90))):
            Circle(SKETCH14_R)
        with Locations(Location((38, 83.480740698, 0), (0, 0, 90))):
            Circle(SKETCH14_R)
        with Locations(Location((38, 51.480740698, 0), (0, 0, 90))):
            Circle(SKETCH14_R)
        Polygon((61.5, 86.980740698), (46.5, 86.980740698), (34.5, 74.980740698), (34.5, 59.980740698), (46.5, 47.980740698), (61.5, 47.980740698), (73.5, 59.980740698), (73.5, 74.980740698), align=None)
    extrude(amount=-CUT_EXTRUDE5_DEPTH, mode=Mode.SUBTRACT)

    # Sketch15 → Cut-Extrude6 (cut)
    with BuildSketch(Plane(origin=(0, 0, -10.5), x_dir=(-1, 0, 0), z_dir=(0, 0, -1))):
        with Locations(Location((70, 83.480740698, 0), (0, 0, 90))):
            Circle(SKETCH15_R)
        with Locations(Location((38, 83.480740698, 0), (0, 0, 90))):
            Circle(SKETCH15_R)
        with Locations(Location((38, 51.480740698, 0), (0, 0, 90))):
            Circle(SKETCH15_R)
        with Locations(Location((70, 51.480740698, 0), (0, 0, 90))):
            Circle(SKETCH15_R)
    extrude(amount=-CUT_EXTRUDE6_DEPTH, mode=Mode.SUBTRACT)

    # Sketch16 → Cut-Extrude7 (cut, symmetric)
    with BuildSketch(Plane(origin=(0, 0, 0), x_dir=(0, 0, -1), z_dir=(1, 0, 0))):
        Polygon((2.5, 0), (-5, 12), (-5, 0), align=None)
    extrude(amount=CUT_EXTRUDE7_DEPTH, both=True, mode=Mode.SUBTRACT)


solid = part.part
